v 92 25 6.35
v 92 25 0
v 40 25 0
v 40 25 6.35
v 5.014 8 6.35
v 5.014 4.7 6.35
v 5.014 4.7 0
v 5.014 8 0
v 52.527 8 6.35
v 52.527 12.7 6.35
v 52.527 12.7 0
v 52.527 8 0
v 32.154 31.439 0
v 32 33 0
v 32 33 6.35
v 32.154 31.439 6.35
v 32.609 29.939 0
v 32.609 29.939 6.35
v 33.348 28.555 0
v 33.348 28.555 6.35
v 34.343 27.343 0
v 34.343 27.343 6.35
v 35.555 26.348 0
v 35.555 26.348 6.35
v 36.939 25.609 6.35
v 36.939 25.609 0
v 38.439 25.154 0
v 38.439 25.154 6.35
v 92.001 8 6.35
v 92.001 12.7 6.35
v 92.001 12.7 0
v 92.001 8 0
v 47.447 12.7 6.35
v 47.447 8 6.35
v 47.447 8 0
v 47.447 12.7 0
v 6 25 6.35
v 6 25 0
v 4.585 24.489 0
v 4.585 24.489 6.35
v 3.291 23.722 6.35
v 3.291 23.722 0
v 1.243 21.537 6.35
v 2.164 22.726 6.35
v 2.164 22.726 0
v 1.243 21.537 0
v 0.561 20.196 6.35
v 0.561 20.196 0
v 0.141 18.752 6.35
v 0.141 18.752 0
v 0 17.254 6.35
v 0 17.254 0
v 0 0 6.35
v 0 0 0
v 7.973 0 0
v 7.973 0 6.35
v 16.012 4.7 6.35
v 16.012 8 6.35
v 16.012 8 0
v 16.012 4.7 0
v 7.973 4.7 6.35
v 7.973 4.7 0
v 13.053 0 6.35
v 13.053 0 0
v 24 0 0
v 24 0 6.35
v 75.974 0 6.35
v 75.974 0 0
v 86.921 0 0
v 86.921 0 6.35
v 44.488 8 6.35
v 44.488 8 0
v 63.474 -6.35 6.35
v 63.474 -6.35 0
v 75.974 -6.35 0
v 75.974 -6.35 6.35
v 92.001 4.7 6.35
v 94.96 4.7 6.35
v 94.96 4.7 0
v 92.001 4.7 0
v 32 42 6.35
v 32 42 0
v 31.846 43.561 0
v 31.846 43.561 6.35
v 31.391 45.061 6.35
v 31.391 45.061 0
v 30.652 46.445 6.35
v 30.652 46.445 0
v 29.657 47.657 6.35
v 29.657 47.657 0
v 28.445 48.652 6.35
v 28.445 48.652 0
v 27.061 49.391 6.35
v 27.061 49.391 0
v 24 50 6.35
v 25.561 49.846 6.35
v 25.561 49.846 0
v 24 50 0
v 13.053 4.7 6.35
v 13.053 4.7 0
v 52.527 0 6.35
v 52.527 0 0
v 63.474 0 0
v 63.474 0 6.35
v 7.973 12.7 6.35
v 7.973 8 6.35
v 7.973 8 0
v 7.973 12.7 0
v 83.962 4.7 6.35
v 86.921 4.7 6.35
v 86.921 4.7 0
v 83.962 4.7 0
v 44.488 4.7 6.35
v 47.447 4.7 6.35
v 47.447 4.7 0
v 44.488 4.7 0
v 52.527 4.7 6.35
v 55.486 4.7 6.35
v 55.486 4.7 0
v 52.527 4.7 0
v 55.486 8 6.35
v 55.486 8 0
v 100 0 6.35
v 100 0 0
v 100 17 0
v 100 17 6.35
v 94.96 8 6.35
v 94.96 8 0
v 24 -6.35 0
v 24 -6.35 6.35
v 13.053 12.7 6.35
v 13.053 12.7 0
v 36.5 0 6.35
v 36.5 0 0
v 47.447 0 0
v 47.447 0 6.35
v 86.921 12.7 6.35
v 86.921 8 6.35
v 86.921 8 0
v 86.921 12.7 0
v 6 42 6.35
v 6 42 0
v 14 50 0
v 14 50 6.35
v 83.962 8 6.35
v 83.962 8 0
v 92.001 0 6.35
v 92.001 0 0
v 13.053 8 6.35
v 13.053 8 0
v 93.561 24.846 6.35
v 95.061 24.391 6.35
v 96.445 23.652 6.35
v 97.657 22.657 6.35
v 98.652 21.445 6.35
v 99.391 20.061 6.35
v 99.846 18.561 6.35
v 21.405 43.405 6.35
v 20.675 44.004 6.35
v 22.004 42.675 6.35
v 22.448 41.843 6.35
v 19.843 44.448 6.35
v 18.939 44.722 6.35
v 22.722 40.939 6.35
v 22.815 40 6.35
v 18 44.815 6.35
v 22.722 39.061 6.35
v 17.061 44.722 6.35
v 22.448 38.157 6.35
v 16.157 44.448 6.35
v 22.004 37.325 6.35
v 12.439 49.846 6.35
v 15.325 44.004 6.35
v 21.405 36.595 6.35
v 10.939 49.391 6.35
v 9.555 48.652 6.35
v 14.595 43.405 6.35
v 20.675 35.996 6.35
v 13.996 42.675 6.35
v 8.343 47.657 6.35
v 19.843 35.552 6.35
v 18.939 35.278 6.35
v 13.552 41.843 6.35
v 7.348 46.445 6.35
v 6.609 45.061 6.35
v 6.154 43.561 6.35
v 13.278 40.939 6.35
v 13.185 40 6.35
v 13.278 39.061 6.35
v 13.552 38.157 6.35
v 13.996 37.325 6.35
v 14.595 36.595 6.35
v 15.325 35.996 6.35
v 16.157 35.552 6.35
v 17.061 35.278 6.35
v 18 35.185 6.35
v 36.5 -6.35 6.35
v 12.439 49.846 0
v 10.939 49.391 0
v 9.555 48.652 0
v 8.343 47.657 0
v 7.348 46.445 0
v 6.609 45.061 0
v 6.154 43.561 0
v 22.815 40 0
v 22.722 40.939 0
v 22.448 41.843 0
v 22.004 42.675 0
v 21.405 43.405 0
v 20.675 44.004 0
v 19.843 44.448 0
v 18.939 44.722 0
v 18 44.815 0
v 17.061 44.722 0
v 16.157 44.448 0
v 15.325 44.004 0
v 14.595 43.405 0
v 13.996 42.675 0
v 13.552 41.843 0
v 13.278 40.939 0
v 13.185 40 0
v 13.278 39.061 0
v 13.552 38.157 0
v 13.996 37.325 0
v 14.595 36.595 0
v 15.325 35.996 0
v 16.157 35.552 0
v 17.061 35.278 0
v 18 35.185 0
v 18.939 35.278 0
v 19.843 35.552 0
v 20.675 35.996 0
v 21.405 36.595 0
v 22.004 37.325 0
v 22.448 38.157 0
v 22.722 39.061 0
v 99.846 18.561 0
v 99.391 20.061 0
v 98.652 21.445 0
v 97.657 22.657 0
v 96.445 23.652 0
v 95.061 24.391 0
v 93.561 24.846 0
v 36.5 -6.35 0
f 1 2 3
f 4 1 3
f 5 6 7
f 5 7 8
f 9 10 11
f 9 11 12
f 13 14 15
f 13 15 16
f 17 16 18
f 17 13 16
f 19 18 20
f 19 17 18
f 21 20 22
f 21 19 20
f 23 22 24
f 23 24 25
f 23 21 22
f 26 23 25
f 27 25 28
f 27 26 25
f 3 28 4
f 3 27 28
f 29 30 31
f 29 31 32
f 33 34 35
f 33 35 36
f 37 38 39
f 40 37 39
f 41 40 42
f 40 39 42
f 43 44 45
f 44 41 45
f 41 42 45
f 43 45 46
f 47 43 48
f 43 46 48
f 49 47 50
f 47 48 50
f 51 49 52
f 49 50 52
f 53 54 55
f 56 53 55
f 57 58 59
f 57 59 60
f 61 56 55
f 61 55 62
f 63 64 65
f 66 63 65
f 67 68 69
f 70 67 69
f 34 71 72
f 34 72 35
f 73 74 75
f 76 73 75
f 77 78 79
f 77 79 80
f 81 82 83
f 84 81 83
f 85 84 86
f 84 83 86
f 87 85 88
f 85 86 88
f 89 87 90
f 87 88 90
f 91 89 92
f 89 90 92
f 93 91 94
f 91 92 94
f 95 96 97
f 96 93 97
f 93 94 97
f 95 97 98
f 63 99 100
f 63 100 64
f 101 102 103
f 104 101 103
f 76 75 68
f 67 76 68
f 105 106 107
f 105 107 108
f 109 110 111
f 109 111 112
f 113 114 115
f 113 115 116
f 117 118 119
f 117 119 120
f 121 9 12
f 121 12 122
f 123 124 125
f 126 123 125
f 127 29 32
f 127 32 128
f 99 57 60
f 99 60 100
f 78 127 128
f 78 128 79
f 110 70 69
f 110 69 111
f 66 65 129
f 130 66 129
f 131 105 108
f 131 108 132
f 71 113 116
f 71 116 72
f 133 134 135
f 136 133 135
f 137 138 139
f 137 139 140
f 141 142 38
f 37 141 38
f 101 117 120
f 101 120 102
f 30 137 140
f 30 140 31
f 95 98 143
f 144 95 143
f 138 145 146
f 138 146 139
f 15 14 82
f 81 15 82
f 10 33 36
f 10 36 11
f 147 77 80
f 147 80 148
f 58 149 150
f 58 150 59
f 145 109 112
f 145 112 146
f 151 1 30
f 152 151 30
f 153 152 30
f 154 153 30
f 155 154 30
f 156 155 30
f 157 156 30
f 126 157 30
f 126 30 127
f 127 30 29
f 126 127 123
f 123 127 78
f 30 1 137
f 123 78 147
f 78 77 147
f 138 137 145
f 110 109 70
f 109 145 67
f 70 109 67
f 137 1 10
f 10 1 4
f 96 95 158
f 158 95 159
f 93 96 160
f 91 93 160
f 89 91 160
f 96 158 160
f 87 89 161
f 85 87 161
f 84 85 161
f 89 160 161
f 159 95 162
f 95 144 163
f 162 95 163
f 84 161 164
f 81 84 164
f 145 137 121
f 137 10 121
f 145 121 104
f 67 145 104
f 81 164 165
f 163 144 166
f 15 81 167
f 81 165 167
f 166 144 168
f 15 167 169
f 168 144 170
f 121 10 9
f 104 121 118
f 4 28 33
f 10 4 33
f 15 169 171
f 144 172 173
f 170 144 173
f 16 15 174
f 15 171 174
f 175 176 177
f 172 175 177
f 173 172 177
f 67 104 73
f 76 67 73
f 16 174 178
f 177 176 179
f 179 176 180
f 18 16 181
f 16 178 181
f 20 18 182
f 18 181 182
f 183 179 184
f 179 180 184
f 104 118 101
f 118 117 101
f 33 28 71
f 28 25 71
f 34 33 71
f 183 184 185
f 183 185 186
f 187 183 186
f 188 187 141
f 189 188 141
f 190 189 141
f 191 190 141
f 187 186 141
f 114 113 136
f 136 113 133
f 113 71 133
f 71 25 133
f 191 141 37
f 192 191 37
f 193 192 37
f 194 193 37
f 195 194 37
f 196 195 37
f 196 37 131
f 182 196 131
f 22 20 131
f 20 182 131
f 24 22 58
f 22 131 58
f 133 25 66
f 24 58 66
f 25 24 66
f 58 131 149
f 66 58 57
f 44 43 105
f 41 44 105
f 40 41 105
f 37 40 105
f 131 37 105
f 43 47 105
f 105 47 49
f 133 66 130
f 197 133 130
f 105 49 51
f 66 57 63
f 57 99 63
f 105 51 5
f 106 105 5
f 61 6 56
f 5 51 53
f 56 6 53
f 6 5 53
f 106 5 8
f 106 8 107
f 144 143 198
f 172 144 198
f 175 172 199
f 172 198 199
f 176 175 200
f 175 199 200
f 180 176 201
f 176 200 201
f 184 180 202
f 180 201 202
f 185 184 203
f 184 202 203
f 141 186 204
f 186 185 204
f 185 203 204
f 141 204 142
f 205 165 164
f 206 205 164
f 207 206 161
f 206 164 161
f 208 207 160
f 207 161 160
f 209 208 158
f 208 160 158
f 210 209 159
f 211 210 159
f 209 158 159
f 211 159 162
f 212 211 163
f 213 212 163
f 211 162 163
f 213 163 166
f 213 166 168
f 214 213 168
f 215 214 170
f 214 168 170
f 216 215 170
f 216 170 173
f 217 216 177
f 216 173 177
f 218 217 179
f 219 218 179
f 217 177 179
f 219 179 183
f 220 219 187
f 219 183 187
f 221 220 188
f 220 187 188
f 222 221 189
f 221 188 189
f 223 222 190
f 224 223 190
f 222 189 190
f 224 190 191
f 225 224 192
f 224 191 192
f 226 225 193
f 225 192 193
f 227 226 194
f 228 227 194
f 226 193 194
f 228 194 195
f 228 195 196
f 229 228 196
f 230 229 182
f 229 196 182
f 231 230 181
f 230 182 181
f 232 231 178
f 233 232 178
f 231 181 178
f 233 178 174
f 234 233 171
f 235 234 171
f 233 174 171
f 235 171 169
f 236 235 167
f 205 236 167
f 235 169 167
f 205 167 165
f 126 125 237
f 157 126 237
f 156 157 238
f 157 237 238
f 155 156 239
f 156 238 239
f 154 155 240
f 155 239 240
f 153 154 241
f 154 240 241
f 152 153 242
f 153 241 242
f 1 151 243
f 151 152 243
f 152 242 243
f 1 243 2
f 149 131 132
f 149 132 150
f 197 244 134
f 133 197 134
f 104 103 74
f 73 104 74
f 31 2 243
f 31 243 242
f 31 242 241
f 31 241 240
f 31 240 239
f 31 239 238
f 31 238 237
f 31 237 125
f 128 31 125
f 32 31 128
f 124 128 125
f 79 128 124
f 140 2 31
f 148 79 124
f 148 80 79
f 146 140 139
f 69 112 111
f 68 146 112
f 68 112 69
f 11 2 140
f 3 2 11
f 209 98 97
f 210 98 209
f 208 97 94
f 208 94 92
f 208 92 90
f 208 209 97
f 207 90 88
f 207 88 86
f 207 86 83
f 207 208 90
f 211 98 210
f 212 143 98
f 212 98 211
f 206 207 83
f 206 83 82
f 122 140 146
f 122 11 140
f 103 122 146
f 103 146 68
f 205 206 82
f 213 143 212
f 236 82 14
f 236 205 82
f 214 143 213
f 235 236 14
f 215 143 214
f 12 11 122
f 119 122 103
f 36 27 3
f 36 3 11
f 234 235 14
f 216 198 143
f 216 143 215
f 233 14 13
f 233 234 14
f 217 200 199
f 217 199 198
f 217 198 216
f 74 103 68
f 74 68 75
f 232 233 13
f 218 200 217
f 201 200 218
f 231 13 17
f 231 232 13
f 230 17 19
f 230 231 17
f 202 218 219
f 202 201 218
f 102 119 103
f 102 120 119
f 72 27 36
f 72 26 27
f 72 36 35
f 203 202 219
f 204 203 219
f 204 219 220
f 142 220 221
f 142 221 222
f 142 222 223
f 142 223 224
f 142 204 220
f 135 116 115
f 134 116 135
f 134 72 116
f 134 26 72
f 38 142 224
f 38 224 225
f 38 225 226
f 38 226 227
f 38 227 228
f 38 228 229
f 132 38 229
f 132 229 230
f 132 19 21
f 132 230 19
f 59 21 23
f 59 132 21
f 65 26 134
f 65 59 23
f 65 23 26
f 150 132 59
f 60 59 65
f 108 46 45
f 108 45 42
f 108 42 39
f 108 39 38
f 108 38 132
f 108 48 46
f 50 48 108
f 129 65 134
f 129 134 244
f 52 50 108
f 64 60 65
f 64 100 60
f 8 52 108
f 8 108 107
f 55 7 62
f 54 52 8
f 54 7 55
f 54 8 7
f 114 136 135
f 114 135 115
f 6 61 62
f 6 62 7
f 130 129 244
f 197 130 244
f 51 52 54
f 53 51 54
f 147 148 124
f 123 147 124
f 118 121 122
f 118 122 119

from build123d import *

# Parameters (mm, degrees)
BOSS_EXTRUDE1_DEPTH = 6.35
SKETCH2_R           = 4.815
CUT_EXTRUDE1_DEPTH  = 6.35
CUT_EXTRUDE2_DEPTH  = 112.983581386
FILLET1_R           = 8


with BuildPart() as part:
    # Sketch1 → Boss-Extrude1 (new body)
    with BuildSketch(Plane.XY):
        Polygon((36.5, 0), (63.4742, 0), (63.4742, -6.35), (75.9742, -6.35), (75.9742, 0), (100, 0), (100, 25), (32, 25), (32, 50), (6, 50), (6, 25), (0, 25), (0, 0), (24, 0), (24, -6.35), (36.5, -6.35), align=None)
    extrude(amount=BOSS_EXTRUDE1_DEPTH)

    # Sketch2 → Cut-Extrude1 (cut)
    with BuildSketch(Plane.XY.offset(6.35)):
        with Locations((18, 40)):
            Circle(SKETCH2_R)
    extrude(amount=-CUT_EXTRUDE1_DEPTH, mode=Mode.SUBTRACT)

    # Sketch3 → Cut-Extrude2 (cut, through all)
    with BuildSketch(Plane.XY.offset(6.35)):
        Polygon((7.9729, 0), (7.9729, 4.7), (5.0138, 4.7), (5.0138, 8), (7.9729, 8), (7.9729, 12.7), (13.0529, 12.7), (13.0529, 8), (16.012, 8), (16.012, 4.7), (13.0529, 4.7), (13.0529, 0), align=None)
        Polygon((47.4471, 12.7), (52.5271, 12.7), (52.5271, 8), (55.4862, 8), (55.4862, 4.7), (52.5271, 4.7), (52.5271, 0), (47.4471, 0), (47.4471, 4.7), (44.488, 4.7), (44.488, 8), (47.4471, 8), align=None)
        Polygon((86.9213, 12.7), (92.0013, 12.7), (92.0013, 8), (94.9604, 8), (94.9604, 4.7), (92.0013, 4.7), (92.0013, 0), (86.9213, 0), (86.9213, 4.7), (83.9622, 4.7), (83.9622, 8), (86.9213, 8), align=None)
    extrude(amount=-CUT_EXTRUDE2_DEPTH, mode=Mode.SUBTRACT)

    # Fillet1
    # the kernel refuses this fillet: 8 mm, written as the material it adds along each edge
    with BuildSketch(Plane(origin=(32, 25, 0), x_dir=(0, 1, 0), z_dir=(0, 0, 1))) as fillet1_piece_1:
        with BuildLine():
            CenterArc((FILLET1_R, -FILLET1_R), FILLET1_R, 90, 90)
            Line((0, -FILLET1_R), (0, 0))
            Line((0, 0), (FILLET1_R, 0))
        make_face()
    extrude(amount=6.35)
    # the kernel refuses this fillet: 8 mm, written as the material it takes off along each edge
    with BuildSketch(Plane(origin=(0, 25, -19.364916731), x_dir=(0, -1, 0), z_dir=(0, 0, 1))) as fillet1_2_piece_1:
        with BuildLine():
            CenterArc((7.745966692, 8), FILLET1_R, 194.477512186, 75.522487814)
            Line((0, 6), (0, 0))
            Line((0, 0), (7.745966692, 0))
        make_face()
    extrude(amount=45.079833462, mode=Mode.SUBTRACT)
    with BuildSketch(Plane(origin=(6, 50, -20), x_dir=(0, -1, 0), z_dir=(0, 0, 1)), Plane(origin=(32, 50, -20), x_dir=(-1, 0, 0), z_dir=(0, 0, 1)), Plane(origin=(100, 25, -20), x_dir=(-1, 0, 0), z_dir=(0, 0, 1))) as fillet1_2_piece_2:
        with BuildLine():
            CenterArc((FILLET1_R, FILLET1_R), FILLET1_R, 180, 90)
            Line((0, FILLET1_R), (0, 0))
            Line((0, 0), (FILLET1_R, 0))
        make_face()
    extrude(amount=46.35, mode=Mode.SUBTRACT)


solid = part.part
